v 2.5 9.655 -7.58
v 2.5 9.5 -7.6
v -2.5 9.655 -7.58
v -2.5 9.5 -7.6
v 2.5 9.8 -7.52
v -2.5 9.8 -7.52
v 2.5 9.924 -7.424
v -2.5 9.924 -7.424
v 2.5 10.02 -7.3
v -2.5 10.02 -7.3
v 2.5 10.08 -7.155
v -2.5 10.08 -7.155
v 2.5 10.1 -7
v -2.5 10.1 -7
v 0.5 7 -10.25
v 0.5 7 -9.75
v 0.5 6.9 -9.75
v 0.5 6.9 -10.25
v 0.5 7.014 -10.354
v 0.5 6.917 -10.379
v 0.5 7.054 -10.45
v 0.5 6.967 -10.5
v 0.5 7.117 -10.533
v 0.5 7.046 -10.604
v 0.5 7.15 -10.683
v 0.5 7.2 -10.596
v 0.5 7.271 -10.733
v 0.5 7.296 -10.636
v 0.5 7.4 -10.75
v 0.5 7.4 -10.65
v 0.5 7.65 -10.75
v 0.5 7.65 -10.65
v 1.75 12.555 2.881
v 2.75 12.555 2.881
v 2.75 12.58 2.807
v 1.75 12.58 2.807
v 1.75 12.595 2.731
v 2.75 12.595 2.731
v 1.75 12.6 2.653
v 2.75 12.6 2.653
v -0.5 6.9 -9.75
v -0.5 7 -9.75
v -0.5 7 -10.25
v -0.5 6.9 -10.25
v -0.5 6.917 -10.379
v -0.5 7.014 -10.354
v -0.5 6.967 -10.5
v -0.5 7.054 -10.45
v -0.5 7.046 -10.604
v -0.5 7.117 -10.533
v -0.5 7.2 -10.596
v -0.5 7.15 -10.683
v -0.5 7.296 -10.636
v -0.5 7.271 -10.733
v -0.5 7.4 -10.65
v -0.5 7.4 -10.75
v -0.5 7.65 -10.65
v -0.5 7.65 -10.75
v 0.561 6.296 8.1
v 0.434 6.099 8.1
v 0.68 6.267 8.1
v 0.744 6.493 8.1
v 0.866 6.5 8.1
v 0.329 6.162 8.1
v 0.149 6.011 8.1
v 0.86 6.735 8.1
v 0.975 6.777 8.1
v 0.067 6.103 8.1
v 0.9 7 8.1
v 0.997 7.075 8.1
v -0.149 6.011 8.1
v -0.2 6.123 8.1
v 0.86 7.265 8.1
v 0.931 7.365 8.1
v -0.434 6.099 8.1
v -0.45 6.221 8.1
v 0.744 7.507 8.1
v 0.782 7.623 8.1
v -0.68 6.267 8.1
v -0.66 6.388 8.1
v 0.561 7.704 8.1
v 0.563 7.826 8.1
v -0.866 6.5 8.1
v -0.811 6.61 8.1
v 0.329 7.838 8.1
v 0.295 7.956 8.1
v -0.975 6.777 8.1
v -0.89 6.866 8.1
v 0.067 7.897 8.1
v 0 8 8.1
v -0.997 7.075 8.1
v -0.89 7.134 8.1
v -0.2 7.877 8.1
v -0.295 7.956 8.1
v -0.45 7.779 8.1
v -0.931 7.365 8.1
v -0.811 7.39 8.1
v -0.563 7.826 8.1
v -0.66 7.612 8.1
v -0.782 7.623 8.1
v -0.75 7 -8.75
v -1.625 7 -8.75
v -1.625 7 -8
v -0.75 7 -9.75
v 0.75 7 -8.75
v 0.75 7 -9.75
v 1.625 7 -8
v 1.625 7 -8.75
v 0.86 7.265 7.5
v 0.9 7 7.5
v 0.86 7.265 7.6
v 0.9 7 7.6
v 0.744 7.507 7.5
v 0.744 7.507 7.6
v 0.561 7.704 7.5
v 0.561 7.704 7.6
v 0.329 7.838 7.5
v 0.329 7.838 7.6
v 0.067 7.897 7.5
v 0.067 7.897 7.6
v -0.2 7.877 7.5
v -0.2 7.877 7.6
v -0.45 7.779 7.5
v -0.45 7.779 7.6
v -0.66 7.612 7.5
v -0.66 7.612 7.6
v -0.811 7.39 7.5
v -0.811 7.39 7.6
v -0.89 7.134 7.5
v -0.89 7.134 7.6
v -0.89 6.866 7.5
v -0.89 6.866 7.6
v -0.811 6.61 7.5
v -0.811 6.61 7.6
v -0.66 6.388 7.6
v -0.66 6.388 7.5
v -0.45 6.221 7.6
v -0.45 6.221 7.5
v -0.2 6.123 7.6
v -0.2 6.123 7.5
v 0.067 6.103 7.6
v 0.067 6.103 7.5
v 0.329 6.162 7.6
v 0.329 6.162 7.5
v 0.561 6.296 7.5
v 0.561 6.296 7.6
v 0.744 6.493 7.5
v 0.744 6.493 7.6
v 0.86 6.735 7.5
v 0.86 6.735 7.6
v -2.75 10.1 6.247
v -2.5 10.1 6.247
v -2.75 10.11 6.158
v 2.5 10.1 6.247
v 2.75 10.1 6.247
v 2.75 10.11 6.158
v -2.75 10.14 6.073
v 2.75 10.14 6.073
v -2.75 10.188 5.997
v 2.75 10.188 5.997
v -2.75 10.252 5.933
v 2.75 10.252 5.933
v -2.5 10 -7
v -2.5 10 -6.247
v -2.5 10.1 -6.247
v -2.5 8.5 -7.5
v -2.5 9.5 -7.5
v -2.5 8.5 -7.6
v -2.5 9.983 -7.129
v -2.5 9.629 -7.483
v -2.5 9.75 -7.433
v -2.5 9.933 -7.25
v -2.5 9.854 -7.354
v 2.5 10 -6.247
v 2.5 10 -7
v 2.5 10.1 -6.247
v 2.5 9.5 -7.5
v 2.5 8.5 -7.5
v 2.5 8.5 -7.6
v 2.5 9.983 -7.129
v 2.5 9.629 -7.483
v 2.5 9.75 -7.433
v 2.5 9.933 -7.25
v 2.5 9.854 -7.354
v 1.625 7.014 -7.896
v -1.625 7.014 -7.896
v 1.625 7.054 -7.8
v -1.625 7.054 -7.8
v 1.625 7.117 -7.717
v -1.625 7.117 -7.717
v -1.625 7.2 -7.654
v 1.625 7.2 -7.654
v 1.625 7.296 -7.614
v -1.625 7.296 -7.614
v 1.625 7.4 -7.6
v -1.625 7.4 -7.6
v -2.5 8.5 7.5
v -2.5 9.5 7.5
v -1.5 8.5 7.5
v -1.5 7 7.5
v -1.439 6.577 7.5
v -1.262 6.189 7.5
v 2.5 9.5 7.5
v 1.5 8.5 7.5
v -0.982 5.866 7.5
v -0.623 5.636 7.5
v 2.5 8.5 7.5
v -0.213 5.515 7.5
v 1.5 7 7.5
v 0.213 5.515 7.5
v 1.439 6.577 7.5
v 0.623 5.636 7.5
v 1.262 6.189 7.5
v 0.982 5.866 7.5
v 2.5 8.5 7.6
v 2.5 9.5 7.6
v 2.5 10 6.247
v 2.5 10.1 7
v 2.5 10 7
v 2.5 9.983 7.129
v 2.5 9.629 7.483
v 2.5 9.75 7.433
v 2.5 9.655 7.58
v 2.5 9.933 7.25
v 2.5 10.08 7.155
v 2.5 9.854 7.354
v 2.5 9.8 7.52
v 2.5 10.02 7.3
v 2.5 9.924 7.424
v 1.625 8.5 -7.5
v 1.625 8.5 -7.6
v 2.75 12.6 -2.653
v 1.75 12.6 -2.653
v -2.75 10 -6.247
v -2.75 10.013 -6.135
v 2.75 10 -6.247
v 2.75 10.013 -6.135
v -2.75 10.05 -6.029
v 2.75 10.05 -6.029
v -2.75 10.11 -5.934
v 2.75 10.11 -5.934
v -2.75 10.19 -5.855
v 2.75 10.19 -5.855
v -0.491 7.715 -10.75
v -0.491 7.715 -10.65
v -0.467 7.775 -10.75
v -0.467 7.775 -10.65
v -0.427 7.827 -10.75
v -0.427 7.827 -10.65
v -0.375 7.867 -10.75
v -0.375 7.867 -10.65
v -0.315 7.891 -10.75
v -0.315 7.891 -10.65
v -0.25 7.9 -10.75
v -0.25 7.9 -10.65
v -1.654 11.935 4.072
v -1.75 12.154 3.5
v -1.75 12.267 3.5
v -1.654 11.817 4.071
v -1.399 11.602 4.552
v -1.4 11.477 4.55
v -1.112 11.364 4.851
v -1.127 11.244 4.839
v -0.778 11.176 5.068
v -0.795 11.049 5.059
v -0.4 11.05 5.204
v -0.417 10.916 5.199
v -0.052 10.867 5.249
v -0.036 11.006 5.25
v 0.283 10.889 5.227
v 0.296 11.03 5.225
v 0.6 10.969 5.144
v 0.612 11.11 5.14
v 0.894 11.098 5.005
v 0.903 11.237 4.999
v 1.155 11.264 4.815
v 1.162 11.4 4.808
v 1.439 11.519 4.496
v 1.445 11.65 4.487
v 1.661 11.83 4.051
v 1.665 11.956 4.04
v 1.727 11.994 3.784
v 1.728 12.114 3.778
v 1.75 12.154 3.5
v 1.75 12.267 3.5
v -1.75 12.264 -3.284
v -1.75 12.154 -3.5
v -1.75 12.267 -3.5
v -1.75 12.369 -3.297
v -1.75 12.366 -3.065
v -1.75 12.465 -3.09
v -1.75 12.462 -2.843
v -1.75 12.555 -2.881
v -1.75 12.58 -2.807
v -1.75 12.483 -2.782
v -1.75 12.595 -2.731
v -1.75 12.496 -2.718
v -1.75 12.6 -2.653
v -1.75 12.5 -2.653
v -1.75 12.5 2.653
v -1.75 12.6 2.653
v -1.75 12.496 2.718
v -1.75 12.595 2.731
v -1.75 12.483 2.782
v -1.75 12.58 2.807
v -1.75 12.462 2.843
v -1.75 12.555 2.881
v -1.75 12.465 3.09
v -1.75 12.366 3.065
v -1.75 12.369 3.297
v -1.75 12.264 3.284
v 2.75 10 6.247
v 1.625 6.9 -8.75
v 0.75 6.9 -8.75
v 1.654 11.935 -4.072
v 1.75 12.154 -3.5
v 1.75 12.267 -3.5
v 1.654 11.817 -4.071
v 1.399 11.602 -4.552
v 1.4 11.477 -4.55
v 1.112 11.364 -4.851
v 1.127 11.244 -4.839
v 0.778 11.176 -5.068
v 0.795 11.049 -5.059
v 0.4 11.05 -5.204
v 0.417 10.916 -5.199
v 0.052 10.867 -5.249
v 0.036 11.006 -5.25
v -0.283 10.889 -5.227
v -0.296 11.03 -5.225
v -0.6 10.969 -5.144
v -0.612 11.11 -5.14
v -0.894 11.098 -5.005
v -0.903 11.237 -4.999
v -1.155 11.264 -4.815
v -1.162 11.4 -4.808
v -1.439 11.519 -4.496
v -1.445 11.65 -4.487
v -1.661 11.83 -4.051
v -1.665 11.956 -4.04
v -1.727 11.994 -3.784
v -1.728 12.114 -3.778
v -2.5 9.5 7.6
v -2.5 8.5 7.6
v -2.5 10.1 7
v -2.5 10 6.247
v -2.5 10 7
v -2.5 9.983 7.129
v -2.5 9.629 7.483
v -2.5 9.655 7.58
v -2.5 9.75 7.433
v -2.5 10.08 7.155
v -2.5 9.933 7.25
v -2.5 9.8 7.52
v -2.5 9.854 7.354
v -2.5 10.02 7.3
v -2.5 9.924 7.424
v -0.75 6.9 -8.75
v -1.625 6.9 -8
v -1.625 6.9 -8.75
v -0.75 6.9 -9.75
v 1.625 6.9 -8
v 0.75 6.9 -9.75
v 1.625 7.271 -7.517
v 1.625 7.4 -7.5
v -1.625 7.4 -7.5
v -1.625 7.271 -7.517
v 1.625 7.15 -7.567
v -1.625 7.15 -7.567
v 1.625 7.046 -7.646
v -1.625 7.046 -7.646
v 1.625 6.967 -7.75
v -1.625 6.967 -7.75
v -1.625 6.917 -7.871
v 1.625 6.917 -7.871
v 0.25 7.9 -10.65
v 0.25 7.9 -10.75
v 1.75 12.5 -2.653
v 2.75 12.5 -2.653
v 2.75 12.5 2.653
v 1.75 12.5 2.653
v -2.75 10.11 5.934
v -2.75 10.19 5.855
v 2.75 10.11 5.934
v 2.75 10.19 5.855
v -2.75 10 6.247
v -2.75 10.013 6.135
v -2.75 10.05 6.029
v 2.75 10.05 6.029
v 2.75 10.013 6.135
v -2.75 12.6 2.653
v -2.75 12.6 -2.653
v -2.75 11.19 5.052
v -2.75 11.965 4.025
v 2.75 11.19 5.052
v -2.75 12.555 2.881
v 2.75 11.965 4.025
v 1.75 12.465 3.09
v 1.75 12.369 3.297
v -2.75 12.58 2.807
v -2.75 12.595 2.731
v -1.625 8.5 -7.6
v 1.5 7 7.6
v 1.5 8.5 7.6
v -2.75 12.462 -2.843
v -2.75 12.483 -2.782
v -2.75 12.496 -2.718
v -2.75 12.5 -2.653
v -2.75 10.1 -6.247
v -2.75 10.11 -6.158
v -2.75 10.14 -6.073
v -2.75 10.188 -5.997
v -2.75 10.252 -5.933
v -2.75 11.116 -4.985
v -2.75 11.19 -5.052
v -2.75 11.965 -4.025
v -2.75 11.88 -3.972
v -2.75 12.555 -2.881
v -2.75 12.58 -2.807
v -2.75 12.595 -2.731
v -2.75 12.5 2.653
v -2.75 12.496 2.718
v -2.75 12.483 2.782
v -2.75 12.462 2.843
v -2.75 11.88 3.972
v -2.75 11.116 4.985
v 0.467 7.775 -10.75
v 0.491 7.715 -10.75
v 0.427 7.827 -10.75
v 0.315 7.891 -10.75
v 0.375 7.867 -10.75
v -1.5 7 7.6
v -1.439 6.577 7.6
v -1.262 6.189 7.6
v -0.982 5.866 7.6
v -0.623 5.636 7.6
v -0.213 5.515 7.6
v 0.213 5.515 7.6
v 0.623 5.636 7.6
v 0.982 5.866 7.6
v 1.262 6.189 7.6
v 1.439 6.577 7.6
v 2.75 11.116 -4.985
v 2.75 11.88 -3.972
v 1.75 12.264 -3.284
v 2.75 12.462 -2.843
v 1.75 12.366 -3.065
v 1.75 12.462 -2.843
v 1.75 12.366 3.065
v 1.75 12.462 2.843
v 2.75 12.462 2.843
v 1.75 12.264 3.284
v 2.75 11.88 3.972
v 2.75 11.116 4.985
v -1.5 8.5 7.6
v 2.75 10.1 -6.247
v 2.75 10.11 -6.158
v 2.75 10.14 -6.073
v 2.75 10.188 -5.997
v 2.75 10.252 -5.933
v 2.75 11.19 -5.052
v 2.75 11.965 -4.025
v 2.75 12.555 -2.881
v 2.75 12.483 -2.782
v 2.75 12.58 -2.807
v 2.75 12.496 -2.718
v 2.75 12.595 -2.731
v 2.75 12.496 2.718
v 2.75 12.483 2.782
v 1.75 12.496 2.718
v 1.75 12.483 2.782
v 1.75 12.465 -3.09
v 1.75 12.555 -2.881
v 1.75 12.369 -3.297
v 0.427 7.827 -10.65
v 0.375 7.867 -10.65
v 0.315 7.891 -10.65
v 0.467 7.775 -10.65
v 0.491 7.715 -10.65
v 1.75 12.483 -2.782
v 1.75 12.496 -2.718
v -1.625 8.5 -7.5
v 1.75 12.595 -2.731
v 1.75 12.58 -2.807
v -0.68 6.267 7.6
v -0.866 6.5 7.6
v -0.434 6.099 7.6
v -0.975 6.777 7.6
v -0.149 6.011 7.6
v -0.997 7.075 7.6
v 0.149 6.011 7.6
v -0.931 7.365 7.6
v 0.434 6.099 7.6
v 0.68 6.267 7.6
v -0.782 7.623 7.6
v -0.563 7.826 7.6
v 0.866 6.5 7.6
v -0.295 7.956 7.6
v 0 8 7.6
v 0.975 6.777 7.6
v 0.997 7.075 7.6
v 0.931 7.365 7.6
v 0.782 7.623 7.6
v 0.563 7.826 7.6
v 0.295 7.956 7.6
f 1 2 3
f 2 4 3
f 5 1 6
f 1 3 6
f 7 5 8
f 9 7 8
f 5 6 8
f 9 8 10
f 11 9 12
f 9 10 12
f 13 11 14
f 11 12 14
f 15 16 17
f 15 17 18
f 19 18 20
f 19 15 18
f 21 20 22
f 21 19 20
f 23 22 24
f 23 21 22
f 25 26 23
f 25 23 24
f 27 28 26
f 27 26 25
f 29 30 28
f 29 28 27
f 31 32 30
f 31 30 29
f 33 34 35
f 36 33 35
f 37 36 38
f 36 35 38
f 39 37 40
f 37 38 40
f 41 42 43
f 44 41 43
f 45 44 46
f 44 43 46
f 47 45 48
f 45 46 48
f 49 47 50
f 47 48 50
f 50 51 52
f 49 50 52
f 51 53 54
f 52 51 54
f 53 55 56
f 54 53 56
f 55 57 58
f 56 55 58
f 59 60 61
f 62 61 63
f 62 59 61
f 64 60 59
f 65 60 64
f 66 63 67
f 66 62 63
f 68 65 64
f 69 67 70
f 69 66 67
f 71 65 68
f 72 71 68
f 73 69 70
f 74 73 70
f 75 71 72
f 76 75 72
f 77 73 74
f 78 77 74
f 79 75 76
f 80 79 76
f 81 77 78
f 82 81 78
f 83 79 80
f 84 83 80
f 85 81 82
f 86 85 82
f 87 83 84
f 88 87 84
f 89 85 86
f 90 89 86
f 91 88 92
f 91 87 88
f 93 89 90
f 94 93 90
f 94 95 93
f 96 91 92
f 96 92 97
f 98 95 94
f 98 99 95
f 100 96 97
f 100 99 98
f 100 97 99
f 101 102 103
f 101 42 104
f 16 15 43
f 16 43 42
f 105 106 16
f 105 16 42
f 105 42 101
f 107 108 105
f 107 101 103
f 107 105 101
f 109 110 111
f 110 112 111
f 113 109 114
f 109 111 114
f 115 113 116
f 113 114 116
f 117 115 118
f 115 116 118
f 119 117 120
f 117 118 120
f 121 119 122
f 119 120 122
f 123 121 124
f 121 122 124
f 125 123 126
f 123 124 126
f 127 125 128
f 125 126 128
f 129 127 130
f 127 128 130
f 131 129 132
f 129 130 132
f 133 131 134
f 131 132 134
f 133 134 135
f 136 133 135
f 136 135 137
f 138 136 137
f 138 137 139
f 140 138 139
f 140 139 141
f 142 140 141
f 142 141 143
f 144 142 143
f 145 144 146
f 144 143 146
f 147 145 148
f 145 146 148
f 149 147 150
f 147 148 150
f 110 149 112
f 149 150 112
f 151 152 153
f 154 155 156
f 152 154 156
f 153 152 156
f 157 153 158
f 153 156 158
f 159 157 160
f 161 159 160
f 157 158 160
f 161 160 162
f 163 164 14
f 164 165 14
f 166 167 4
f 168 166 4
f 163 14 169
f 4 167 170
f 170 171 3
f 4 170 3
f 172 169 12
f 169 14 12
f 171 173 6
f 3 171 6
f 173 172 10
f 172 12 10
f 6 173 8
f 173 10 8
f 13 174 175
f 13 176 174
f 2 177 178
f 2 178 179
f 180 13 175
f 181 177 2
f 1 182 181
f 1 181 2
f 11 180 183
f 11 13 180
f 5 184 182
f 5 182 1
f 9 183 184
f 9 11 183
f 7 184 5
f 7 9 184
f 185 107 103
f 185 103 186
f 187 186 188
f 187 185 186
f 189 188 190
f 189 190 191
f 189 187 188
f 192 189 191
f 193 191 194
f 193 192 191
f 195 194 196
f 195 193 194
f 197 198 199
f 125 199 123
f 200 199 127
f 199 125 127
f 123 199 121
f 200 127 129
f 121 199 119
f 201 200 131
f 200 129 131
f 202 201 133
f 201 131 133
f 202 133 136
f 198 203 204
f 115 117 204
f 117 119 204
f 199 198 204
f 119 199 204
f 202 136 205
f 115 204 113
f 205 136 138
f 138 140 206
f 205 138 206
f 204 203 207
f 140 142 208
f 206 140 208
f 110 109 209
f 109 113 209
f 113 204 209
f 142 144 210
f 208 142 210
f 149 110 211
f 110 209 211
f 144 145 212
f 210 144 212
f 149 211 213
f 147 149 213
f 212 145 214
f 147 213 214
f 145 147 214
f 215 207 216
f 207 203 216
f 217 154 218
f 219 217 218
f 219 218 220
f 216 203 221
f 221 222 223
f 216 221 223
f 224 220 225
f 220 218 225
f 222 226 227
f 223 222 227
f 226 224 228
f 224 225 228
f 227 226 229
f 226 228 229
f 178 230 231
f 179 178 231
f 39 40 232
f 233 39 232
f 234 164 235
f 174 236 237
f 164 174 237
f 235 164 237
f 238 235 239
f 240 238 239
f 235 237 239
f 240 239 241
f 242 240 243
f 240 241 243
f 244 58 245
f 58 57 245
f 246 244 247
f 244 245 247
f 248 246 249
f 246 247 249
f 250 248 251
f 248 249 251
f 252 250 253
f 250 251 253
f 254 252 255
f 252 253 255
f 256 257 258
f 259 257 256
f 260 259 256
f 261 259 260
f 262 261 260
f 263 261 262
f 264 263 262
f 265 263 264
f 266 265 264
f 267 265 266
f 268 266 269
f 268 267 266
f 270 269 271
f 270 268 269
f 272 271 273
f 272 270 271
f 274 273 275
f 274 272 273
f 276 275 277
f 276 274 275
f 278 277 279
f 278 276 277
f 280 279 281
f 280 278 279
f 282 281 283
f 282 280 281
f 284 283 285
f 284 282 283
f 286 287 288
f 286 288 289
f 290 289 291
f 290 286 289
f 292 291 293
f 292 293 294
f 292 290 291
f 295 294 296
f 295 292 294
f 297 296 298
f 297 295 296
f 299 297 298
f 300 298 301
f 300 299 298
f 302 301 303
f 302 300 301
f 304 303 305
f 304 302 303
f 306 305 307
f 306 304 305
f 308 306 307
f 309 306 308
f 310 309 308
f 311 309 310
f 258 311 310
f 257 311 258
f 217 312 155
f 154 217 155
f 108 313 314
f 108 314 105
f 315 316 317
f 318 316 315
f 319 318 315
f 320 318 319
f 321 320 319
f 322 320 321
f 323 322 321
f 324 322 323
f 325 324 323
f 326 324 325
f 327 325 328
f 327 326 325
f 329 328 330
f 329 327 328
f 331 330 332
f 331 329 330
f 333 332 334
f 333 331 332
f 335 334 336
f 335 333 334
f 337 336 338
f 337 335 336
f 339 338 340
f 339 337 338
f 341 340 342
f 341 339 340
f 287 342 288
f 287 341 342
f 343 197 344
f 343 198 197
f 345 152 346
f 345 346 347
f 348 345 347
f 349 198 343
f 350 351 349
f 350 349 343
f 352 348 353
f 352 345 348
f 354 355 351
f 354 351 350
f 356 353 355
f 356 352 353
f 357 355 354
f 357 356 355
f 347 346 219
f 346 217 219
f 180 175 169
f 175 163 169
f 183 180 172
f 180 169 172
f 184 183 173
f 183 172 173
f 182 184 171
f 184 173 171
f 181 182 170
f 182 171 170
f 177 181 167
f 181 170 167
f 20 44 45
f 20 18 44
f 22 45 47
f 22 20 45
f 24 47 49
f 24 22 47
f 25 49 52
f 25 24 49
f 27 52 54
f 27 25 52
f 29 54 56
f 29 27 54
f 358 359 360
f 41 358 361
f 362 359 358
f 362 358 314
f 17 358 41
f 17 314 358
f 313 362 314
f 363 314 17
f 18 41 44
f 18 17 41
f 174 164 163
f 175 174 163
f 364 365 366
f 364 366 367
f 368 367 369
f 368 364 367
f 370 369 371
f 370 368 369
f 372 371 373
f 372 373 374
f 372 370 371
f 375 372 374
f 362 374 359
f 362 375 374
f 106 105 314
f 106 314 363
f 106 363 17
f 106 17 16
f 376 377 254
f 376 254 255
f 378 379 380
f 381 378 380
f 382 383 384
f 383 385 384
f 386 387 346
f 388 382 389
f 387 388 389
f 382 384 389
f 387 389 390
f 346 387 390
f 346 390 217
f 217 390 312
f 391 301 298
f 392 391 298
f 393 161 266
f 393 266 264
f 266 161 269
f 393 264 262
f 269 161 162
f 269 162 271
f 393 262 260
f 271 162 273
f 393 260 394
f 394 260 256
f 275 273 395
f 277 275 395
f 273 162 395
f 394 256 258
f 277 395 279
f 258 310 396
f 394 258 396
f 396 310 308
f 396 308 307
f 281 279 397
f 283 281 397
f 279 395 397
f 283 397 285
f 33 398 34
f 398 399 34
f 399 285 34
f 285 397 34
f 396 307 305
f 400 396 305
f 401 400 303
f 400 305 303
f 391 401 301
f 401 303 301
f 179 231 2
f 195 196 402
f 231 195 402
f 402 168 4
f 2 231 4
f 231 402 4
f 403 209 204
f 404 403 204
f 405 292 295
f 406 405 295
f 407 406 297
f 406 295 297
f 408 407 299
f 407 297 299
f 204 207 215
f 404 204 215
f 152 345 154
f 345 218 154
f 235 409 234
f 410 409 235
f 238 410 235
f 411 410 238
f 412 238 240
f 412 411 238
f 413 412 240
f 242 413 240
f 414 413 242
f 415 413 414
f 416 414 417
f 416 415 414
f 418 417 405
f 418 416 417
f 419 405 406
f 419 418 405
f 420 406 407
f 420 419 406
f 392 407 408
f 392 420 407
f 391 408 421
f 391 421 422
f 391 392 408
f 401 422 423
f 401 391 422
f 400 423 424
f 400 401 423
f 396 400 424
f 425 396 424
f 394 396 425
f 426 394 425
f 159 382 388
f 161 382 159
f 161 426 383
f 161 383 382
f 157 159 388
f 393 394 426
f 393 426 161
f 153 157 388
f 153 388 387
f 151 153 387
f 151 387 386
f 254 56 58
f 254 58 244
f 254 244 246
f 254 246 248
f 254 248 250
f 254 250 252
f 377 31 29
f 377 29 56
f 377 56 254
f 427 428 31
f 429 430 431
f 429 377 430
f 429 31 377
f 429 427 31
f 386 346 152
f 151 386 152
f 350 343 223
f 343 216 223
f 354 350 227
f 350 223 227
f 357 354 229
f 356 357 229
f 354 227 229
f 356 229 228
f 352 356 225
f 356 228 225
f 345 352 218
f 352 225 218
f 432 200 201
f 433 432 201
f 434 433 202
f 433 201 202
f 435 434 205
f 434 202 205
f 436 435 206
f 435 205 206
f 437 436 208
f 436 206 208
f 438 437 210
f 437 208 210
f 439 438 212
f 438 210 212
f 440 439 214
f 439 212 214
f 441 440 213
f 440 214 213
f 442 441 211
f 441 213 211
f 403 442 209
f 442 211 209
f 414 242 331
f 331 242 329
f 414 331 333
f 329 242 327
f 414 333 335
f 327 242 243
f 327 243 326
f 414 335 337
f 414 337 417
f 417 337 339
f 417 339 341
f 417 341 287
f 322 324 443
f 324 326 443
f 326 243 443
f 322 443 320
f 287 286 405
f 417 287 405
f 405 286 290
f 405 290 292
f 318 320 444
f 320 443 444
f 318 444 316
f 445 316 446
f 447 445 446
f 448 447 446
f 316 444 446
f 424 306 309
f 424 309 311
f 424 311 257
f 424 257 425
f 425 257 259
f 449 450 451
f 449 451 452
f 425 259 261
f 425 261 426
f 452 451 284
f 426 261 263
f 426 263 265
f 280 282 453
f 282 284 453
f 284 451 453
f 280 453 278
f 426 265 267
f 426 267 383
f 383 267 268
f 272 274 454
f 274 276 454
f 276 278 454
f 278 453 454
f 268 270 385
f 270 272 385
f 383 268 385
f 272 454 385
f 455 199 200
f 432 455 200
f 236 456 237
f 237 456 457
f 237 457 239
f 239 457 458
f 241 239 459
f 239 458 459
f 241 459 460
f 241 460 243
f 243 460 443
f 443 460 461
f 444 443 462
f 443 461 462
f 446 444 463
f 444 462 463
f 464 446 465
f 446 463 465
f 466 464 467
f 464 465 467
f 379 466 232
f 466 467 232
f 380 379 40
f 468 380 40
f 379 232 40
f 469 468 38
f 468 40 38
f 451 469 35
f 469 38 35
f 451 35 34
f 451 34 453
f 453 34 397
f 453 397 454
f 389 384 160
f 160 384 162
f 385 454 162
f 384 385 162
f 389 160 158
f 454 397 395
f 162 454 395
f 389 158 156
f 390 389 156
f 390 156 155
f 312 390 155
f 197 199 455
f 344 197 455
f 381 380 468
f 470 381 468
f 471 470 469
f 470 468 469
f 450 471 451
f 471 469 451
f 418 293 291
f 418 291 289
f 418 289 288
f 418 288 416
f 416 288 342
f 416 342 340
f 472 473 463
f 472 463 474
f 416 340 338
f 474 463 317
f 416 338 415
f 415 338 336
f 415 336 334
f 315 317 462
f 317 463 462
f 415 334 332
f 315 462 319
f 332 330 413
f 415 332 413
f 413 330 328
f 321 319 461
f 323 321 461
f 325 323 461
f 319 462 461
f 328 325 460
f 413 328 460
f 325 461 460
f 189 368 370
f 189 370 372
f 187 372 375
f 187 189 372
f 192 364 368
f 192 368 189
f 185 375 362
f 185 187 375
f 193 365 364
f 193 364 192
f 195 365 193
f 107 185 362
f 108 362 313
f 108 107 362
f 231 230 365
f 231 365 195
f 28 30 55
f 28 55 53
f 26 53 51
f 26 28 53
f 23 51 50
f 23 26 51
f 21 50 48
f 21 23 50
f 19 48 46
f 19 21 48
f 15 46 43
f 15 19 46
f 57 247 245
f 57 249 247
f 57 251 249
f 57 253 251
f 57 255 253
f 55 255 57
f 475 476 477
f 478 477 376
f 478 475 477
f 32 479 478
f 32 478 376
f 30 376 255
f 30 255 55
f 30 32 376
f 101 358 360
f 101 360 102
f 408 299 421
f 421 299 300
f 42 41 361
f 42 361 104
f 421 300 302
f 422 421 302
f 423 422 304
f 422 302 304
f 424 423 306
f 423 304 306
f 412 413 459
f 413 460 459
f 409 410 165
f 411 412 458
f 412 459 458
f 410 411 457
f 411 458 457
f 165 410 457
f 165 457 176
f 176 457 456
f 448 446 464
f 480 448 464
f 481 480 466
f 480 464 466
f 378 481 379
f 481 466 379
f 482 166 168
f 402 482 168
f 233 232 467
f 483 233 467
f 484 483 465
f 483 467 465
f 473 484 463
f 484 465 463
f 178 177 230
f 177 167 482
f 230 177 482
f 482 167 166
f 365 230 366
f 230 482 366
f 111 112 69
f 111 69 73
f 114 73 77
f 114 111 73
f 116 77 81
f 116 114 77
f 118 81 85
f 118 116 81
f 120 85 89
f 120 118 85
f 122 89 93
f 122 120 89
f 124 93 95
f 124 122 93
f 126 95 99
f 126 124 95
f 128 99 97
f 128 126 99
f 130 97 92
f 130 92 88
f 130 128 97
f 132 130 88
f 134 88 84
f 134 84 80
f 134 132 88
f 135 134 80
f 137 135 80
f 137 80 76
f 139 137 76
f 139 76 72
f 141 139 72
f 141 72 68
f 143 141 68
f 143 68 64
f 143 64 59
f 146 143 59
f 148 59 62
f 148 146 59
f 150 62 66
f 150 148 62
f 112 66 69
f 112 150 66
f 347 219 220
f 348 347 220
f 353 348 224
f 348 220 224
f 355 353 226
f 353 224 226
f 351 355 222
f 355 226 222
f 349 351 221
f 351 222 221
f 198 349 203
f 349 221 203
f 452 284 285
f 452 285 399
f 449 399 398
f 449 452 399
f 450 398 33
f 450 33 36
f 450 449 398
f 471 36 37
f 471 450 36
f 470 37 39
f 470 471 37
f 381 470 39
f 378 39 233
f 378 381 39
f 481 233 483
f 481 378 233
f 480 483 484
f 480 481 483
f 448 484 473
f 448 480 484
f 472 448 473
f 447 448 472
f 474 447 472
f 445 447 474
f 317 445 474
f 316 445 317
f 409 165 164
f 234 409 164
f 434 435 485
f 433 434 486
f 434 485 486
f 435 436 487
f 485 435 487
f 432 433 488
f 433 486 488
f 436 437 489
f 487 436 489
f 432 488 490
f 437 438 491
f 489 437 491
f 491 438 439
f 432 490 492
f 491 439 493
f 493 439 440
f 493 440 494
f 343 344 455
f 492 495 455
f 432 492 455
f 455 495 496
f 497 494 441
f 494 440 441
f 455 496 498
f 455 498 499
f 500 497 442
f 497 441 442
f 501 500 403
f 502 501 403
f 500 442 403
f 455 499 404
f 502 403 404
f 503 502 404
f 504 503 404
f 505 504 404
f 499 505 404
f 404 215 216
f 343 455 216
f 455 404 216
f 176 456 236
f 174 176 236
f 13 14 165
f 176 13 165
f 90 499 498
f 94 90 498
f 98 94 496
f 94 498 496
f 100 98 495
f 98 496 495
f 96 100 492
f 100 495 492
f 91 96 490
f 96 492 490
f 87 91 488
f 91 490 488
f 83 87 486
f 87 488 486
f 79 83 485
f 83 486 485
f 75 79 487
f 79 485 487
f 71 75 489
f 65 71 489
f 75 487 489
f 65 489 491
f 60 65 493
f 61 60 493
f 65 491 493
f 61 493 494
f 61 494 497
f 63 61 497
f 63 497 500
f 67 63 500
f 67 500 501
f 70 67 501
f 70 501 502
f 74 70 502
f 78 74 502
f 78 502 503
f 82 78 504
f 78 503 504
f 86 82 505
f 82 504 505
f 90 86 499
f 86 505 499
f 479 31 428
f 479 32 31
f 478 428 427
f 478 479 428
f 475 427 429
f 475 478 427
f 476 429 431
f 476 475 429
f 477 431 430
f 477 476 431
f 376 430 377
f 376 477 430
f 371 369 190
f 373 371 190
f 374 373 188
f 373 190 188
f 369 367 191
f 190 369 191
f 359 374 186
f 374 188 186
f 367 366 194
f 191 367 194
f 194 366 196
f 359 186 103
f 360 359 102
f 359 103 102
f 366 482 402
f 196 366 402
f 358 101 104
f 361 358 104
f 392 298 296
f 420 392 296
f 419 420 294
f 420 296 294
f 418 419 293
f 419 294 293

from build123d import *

# Parameters (mm, degrees)
EXTRUDE1_DEPTH     = 2.75
CUT_EXTRUDE1_DEPTH = 15.329956996
EXTRUDE2_DEPTH     = 2.5
EXTRUDE3_DEPTH     = 1.625
SKETCH8_W          = 1
SKETCH8_H          = 0.1
EXTRUDE4_DEPTH     = 0.75
EXTRUDE5_DEPTH     = 0.5
EXTRUDE6_DEPTH     = 0.1
SKETCH11_R         = 1
SKETCH11_R_2       = 0.9
EXTRUDE7_DEPTH     = 0.5
CUT_EXTRUDE2_REACH = 24.429
SKETCH12_R         = 0.9
FILLET1_R          = 0.25


with BuildPart() as part:
    # Sketch4 → Extrude1 (new, symmetric)
    with BuildSketch(Plane(origin=(0, 0, 0), x_dir=(0, 0, -1), z_dir=(1, 0, 0))):
        with BuildLine():
            Line((-2.652797108, 12.6), (2.652797108, 12.6))
            ThreePointArc((2.652797108, 12.6), (2.769316269, 12.58857734), (2.8813989, 12.554744284))
            ThreePointArc((2.8813989, 12.554744284), (4.555213838, 11.599383852), (5.933197614, 10.251967541))
            ThreePointArc((5.933197614, 10.251967541), (6.072675346, 10.139990984), (6.247012686, 10.1))
            Line((6.247012686, 10.1), (6.247012686, 10))
            ThreePointArc((6.247012686, 10), (6.029091011, 10.04998873), (5.854743846, 10.189959426))
            ThreePointArc((5.854743846, 10.189959426), (4.494980939, 11.519559057), (2.843298601, 12.462286904))
            ThreePointArc((2.843298601, 12.462286904), (2.749896409, 12.490481117), (2.652797108, 12.5))
            Line((2.652797108, 12.5), (-2.652797108, 12.5))
            ThreePointArc((-2.652797108, 12.5), (-2.749896409, 12.490481117), (-2.843298601, 12.462286904))
            ThreePointArc((-2.843298601, 12.462286904), (-4.494980939, 11.519559057), (-5.854743846, 10.189959426))
            ThreePointArc((-5.854743846, 10.189959426), (-6.029091011, 10.04998873), (-6.247012686, 10))
            Line((-6.247012686, 10), (-6.247012686, 10.1))
            ThreePointArc((-6.247012686, 10.1), (-6.072675346, 10.139990984), (-5.933197614, 10.251967541))
            ThreePointArc((-5.933197614, 10.251967541), (-4.555213838, 11.599383852), (-2.8813989, 12.554744284))
            ThreePointArc((-2.8813989, 12.554744284), (-2.769316269, 12.58857734), (-2.652797108, 12.6))
        make_face()
    extrude(amount=EXTRUDE1_DEPTH, both=True)

    # Sketch5 → Cut-Extrude1 (cut, through all)
    with BuildSketch(Plane(origin=(0, 0, 0), x_dir=(1, 0, 0), z_dir=(0, 1, 0))):
        with BuildLine():
            Line((1.75, -3.5), (1.75, 3.5))
            ThreePointArc((1.75, 3.5), (0, 5.25), (-1.75, 3.5))
            Line((-1.75, 3.5), (-1.75, -3.5))
            ThreePointArc((-1.75, -3.5), (0, -5.25), (1.75, -3.5))
        make_face()
    extrude(amount=CUT_EXTRUDE1_DEPTH, mode=Mode.SUBTRACT)

    # Sketch6 → Extrude2 (add, symmetric)
    with BuildSketch(Plane(origin=(0, 0, 0), x_dir=(0, 0, -1), z_dir=(1, 0, 0))):
        with BuildLine():
            Line((6.247012686, 10), (7, 10))
            ThreePointArc((7, 10), (7.353553391, 9.853553391), (7.5, 9.5))
            Line((7.5, 9.5), (7.5, 8.5))
            Line((7.5, 8.5), (7.6, 8.5))
            Line((7.6, 8.5), (7.6, 9.5))
            ThreePointArc((7.6, 9.5), (7.424264069, 9.924264069), (7, 10.1))
            Line((7, 10.1), (6.247012686, 10.1))
            Line((6.247012686, 10.1), (6.247012686, 10))
        make_face()
        with BuildLine():
            Line((-7.5, 8.5), (-7.6, 8.5))
            Line((-7.6, 8.5), (-7.6, 9.5))
            ThreePointArc((-7.6, 9.5), (-7.424264069, 9.924264069), (-7, 10.1))
            Line((-7, 10.1), (-6.247012686, 10.1))
            Line((-6.247012686, 10.1), (-6.247012686, 10))
            Line((-6.247012686, 10), (-7, 10))
            ThreePointArc((-7, 10), (-7.353553391, 9.853553391), (-7.5, 9.5))
            Line((-7.5, 9.5), (-7.5, 8.5))
        make_face()
    extrude(amount=EXTRUDE2_DEPTH, both=True)

    # Sketch7 → Extrude3 (add, symmetric)
    with BuildSketch(Plane(origin=(0, 0, 0), x_dir=(0, 0, -1), z_dir=(1, 0, 0))):
        with BuildLine():
            Line((7.5, 8.5), (7.5, 7.4))
            ThreePointArc((7.5, 7.4), (7.646446609, 7.046446609), (8, 6.9))
            Line((8, 6.9), (8.75, 6.9))
            Line((8.75, 6.9), (8.75, 7))
            Line((8.75, 7), (8, 7))
            ThreePointArc((8, 7), (7.717157288, 7.117157288), (7.6, 7.4))
            Line((7.6, 7.4), (7.6, 8.5))
            Line((7.6, 8.5), (7.5, 8.5))
        make_face()
    extrude(amount=EXTRUDE3_DEPTH, both=True)

    # Sketch8 → Extrude4 (add, symmetric)
    with BuildSketch(Plane(origin=(0, 0, 0), x_dir=(0, 0, -1), z_dir=(1, 0, 0))):
        with Locations((9.25, 6.95)):
            Rectangle(SKETCH8_W, SKETCH8_H)
    extrude(amount=EXTRUDE4_DEPTH, both=True)

    # Sketch9 → Extrude5 (add, symmetric)
    with BuildSketch(Plane(origin=(0, 0, 0), x_dir=(0, 0, -1), z_dir=(1, 0, 0))):
        with BuildLine():
            Line((10.75, 7.4), (10.75, 7.9))
            Line((10.75, 7.9), (10.65, 7.9))
            Line((10.65, 7.9), (10.65, 7.4))
            ThreePointArc((10.65, 7.4), (10.532842712, 7.117157288), (10.25, 7))
            Line((10.25, 7), (9.75, 7))
            Line((9.75, 7), (9.75, 6.9))
            Line((9.75, 6.9), (10.25, 6.9))
            ThreePointArc((10.25, 6.9), (10.603553391, 7.046446609), (10.75, 7.4))
        make_face()
    extrude(amount=EXTRUDE5_DEPTH, both=True)

    # Sketch10 → Extrude6 (add)
    with BuildSketch(Plane.XY.offset(7.5)):
        with BuildLine():
            Line((-1.5, 8.5), (-1.5, 7))
            ThreePointArc((-1.5, 7), (0, 5.5), (1.5, 7))
            Line((1.5, 7), (1.5, 8.5))
            Line((1.5, 8.5), (-1.5, 8.5))
        make_face()
    extrude(amount=EXTRUDE6_DEPTH)

    # Sketch11 → Extrude7 (add)
    with BuildSketch(Plane.XY.offset(7.6)):
        with Locations(Location((0, 7, 0), (0, 0, 90))):
            Circle(SKETCH11_R)
        with Locations((0, 7)):
            Circle(SKETCH11_R_2, mode=Mode.SUBTRACT)
    extrude(amount=EXTRUDE7_DEPTH)

    # Sketch12 → Cut-Extrude2 (cut, up to next)
    with BuildSketch(Plane.XY.offset(7.6), mode=Mode.PRIVATE) as cut_extrude2_sk1:
        with Locations((0, 7)):
            Circle(SKETCH12_R)
    cut_extrude2_tool1 = extrude(cut_extrude2_sk1.sketch, amount=-CUT_EXTRUDE2_REACH, mode=Mode.PRIVATE) & part.part
    add(cut_extrude2_tool1.solids().sort_by_distance((0, 7, 7.6))[0], mode=Mode.SUBTRACT)

    # Fillet1
    fillet1_edges = [part.edges().sort_by_distance(p)[0] for p in [
        (-0.5, 7.9, -10.7),
        (0.5, 7.9, -10.7),
    ]]
    fillet(fillet1_edges, radius=FILLET1_R)


solid = part.part
